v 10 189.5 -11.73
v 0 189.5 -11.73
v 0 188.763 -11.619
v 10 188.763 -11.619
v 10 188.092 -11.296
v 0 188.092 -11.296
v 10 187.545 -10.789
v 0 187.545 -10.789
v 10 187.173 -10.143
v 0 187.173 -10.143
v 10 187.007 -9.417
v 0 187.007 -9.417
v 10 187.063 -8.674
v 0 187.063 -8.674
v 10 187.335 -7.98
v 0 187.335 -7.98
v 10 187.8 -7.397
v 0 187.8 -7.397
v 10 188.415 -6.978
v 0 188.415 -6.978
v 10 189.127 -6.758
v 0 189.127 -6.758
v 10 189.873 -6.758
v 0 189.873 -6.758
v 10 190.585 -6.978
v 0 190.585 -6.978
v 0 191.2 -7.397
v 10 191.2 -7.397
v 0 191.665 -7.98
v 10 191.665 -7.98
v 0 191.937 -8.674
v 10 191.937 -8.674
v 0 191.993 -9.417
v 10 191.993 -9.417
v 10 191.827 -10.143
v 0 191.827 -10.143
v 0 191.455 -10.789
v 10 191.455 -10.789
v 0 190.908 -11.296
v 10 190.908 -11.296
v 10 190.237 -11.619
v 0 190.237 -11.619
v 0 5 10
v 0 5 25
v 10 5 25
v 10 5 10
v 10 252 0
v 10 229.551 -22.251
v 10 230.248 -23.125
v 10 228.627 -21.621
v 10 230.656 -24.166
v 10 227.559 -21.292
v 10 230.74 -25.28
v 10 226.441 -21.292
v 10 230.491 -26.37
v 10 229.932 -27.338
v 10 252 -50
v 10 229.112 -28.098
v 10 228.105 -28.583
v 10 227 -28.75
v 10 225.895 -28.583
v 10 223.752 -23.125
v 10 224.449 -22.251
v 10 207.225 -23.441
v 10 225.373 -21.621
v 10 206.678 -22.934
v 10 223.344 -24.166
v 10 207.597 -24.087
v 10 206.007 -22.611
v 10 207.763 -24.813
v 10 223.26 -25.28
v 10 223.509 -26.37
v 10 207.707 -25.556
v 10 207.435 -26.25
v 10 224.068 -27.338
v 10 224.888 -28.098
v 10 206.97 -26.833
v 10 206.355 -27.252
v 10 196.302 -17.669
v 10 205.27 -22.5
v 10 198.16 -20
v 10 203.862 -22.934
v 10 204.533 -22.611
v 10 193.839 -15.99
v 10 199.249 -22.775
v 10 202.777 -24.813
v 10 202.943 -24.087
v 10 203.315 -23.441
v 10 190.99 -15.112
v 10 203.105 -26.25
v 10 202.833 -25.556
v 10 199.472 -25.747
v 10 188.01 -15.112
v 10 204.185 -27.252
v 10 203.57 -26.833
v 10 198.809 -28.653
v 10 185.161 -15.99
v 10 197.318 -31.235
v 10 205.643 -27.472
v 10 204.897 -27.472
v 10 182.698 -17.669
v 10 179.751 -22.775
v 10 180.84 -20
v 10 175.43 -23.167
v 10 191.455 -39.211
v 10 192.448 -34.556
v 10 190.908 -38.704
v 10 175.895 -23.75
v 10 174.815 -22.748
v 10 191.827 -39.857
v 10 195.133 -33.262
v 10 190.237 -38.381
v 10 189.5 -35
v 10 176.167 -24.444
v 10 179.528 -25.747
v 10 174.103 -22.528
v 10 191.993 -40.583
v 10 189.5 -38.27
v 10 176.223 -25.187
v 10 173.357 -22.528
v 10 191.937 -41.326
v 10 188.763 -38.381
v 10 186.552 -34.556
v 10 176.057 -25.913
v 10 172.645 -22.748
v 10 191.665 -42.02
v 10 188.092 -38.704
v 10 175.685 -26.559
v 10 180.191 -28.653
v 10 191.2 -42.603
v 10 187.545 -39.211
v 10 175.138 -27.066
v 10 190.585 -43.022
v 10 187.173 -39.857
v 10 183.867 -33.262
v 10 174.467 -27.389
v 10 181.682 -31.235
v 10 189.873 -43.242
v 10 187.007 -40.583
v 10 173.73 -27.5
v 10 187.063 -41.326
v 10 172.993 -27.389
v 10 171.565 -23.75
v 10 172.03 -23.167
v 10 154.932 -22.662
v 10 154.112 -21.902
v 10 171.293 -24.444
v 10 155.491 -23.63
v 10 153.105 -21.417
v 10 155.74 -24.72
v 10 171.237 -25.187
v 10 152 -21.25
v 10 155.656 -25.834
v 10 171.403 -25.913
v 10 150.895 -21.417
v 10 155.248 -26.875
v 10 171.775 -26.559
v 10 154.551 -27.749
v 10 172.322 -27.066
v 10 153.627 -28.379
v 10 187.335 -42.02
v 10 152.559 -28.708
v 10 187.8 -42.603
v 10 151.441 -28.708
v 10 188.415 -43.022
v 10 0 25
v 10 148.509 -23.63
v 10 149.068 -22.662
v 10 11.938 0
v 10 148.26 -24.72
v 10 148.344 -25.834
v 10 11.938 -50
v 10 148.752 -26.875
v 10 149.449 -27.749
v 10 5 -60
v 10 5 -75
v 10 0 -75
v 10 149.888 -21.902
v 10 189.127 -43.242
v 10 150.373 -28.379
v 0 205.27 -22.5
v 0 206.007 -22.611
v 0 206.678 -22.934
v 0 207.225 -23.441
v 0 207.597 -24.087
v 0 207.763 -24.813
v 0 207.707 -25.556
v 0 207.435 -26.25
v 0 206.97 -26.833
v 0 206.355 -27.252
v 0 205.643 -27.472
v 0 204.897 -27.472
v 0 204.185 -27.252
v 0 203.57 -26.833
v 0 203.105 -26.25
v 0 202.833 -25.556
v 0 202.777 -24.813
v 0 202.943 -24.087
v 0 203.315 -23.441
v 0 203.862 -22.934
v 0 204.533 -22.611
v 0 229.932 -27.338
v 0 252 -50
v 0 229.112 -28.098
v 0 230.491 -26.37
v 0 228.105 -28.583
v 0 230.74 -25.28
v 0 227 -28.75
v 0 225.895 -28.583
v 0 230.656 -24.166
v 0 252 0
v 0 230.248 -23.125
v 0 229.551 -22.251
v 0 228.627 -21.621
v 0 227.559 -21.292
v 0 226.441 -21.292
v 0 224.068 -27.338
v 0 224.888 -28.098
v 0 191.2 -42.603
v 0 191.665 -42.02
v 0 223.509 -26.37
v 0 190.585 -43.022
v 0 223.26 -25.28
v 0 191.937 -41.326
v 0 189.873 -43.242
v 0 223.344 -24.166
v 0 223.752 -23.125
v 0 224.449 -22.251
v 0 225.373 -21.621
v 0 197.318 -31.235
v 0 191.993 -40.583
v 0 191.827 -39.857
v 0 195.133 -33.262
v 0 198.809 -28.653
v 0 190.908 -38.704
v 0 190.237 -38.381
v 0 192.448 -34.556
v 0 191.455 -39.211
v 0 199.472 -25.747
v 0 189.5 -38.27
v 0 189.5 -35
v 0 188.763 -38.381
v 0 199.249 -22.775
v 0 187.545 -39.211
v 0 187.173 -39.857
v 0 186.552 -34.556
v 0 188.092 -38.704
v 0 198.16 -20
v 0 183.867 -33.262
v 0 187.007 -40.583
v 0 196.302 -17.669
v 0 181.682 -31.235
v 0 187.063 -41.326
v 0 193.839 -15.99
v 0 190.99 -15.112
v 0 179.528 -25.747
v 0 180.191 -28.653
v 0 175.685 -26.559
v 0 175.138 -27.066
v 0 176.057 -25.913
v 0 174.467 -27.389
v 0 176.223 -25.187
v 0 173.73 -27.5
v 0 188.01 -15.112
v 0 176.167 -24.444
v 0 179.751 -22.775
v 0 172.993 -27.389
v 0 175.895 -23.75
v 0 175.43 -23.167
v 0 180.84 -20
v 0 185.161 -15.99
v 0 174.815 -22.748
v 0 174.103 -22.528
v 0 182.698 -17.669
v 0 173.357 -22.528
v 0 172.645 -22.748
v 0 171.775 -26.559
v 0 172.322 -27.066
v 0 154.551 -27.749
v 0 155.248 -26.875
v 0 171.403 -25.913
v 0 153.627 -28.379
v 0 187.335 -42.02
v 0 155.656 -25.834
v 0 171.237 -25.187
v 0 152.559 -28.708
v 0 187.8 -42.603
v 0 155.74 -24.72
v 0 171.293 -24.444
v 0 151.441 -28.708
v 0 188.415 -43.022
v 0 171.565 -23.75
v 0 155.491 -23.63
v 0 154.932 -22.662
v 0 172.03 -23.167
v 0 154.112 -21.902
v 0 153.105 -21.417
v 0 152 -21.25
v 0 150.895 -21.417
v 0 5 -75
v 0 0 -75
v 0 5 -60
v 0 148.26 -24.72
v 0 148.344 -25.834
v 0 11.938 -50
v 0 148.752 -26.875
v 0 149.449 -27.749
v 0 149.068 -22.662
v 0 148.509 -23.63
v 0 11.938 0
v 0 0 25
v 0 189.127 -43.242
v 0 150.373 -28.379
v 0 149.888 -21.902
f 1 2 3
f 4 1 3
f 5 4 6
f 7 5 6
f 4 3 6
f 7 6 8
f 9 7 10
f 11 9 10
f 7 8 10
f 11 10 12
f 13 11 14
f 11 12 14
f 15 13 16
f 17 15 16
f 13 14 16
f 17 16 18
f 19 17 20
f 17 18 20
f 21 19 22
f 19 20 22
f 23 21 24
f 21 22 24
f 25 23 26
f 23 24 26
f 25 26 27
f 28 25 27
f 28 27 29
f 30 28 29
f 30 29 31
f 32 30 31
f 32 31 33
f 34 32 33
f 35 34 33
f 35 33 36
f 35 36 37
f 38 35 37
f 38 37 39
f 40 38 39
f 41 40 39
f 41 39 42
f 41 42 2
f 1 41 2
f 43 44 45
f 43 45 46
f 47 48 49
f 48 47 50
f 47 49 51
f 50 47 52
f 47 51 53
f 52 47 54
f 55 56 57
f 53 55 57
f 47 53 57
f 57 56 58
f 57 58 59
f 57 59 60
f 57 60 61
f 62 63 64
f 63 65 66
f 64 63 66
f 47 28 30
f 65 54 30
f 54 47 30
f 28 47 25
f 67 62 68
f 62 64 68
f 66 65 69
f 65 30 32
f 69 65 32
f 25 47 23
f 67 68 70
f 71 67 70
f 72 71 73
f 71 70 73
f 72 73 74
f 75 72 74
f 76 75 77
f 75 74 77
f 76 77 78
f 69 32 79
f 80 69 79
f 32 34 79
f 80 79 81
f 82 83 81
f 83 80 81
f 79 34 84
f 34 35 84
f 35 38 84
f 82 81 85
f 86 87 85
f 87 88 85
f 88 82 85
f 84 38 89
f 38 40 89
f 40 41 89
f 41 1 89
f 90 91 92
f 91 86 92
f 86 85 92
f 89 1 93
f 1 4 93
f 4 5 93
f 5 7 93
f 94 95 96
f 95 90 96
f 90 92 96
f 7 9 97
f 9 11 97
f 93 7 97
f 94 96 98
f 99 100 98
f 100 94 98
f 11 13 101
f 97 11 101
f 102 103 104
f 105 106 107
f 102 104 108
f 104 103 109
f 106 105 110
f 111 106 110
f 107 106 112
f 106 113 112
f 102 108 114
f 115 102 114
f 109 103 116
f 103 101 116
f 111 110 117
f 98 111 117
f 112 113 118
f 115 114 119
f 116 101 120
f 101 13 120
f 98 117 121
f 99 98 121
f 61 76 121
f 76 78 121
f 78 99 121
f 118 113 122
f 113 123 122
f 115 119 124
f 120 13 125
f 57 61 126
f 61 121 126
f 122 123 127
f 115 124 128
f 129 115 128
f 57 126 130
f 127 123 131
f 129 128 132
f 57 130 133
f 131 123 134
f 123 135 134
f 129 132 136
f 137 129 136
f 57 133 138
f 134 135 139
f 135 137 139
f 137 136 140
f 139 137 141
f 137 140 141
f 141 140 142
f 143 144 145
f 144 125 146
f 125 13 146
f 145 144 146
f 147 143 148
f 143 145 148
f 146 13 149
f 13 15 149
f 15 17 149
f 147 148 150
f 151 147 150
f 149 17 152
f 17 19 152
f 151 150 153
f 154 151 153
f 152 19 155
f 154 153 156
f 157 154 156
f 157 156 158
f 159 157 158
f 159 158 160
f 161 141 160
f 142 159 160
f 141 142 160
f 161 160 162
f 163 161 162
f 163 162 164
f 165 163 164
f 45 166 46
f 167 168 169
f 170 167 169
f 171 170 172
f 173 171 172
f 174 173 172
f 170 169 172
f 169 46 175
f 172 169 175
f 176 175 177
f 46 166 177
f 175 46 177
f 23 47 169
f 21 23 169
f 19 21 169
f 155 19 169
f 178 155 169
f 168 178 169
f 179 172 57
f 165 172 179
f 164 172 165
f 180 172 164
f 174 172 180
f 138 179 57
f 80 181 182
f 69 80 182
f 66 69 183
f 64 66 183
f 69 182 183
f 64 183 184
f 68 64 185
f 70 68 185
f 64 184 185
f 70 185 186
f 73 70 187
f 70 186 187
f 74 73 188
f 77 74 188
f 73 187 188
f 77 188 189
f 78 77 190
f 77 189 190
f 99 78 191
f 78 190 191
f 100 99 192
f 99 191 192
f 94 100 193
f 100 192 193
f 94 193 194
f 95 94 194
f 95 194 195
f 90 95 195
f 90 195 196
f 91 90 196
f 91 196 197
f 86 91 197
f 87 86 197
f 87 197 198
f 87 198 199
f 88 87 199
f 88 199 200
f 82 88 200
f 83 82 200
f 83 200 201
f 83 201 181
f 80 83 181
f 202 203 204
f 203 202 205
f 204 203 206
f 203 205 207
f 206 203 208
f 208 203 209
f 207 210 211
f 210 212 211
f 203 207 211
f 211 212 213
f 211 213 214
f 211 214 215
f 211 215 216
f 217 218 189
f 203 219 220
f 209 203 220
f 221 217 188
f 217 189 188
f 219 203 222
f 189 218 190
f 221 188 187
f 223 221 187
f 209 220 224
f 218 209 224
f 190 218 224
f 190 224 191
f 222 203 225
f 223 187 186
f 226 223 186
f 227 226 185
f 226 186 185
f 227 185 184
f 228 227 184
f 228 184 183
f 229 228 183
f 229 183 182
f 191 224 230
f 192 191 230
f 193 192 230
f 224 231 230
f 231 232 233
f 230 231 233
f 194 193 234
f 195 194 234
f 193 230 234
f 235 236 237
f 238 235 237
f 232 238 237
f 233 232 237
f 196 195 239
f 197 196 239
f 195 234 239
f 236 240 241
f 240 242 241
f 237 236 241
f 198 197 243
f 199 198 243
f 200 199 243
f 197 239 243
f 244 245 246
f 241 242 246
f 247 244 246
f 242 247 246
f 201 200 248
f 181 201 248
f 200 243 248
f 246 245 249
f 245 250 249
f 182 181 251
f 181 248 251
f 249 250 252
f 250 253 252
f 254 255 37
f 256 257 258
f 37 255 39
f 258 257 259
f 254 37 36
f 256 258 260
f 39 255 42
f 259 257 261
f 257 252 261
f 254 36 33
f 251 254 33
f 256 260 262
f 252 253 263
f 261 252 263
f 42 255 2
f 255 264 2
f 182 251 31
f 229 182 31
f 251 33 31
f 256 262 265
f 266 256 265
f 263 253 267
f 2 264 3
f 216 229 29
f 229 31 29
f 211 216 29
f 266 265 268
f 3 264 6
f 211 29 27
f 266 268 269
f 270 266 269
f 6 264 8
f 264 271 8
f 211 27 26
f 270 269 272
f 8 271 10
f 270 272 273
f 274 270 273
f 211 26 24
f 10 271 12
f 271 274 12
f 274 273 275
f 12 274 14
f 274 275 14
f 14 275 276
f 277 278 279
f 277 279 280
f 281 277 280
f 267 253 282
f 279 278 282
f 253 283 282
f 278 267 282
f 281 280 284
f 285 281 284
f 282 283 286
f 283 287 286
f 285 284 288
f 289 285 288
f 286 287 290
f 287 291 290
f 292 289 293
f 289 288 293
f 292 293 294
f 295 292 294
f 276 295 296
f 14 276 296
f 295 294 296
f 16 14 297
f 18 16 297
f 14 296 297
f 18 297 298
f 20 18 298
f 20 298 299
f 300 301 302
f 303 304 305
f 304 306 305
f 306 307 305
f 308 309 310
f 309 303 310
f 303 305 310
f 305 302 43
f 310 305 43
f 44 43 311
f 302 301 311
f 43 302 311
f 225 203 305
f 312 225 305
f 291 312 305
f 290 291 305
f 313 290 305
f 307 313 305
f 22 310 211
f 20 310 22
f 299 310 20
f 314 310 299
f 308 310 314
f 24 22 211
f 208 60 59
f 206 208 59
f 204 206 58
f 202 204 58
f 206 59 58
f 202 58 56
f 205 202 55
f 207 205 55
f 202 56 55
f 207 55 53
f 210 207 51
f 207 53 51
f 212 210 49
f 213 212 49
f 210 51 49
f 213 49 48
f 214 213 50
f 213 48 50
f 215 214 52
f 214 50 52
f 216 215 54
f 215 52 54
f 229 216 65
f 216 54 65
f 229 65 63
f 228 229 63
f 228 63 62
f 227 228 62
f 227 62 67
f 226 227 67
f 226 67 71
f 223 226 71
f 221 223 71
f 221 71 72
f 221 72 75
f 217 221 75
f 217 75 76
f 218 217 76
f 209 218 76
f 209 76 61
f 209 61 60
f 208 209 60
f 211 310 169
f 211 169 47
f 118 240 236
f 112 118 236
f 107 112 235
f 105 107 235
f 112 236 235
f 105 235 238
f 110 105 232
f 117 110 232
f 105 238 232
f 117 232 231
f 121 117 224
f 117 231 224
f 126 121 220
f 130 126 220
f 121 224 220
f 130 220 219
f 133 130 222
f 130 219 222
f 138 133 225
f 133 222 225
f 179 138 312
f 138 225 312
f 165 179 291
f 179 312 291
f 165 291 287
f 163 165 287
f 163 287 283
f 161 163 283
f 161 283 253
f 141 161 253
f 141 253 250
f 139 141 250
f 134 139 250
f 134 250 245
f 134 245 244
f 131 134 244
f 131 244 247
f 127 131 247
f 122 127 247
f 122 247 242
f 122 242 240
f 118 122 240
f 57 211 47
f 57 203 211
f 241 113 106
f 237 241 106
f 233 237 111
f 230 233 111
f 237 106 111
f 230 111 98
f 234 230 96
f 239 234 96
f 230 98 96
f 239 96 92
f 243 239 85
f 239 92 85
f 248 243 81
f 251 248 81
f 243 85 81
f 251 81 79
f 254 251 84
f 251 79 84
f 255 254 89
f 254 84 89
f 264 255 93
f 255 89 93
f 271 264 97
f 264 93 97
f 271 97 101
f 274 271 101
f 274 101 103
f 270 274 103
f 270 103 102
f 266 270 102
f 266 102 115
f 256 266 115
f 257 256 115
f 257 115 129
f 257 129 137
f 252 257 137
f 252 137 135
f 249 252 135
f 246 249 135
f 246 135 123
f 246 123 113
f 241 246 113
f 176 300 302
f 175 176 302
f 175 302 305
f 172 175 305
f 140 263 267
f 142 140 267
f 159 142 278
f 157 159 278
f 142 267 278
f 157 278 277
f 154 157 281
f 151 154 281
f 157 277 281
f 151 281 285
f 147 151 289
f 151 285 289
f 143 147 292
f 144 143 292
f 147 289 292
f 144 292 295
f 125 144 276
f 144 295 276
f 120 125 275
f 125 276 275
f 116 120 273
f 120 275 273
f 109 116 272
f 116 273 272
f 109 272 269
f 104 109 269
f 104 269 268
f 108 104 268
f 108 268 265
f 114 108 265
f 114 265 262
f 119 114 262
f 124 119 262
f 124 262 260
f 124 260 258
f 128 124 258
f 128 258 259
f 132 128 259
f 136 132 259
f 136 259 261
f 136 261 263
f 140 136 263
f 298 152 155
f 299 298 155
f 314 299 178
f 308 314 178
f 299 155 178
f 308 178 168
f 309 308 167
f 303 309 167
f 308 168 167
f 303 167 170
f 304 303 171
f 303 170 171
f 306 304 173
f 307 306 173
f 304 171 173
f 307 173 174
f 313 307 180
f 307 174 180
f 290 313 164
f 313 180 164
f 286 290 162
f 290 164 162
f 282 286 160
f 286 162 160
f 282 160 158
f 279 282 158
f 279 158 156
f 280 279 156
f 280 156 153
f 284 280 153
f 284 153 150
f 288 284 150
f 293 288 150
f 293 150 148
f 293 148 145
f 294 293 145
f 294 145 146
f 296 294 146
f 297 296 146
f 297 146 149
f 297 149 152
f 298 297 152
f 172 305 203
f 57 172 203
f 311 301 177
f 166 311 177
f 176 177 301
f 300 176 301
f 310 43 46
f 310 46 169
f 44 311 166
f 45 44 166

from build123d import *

# Parameters (mm, degrees)
BOSS_EXTRUDE1_DEPTH = 252
CUT_EXTRUDE2_DEPTH  = 10
SKETCH4_W           = 25
SKETCH4_H           = 52
CUT_EXTRUDE3_DEPTH  = 10
SKETCH5_R           = 3.75
SKETCH5_R_2         = 10
CUT_EXTRUDE5_DEPTH  = 264.114043715
SKETCH6_R           = 2.5
CUT_EXTRUDE6_DEPTH  = 264.114043715


with BuildPart() as part:
    # Sketch1 → Boss-Extrude1 (new body)
    with BuildSketch(Plane(origin=(0, 0, 0), x_dir=(1, 0, 0), z_dir=(0, 1, 0))):
        Polygon((10, 0), (10, 50), (10, 75), (0, 75), (0, 50), (0, 0), (0, -25), (10, -25), align=None)
    extrude(amount=BOSS_EXTRUDE1_DEPTH)

    # Sketch3 → Cut-Extrude2 (cut)
    with BuildSketch(Plane.ZY):
        Polygon((25, 200), (25, 5), (10, 5), (0, 11.937821542), (0, 200), align=None)
        Polygon((-75, 5), (-60, 5), (-50, 11.937821542), (-50, 252), (-75, 252), align=None)
    extrude(amount=-CUT_EXTRUDE2_DEPTH, mode=Mode.SUBTRACT)

    # Sketch4 → Cut-Extrude3 (cut)
    with BuildSketch(Plane(origin=(10, 0, 0), x_dir=(0, 0, -1), z_dir=(1, 0, 0))):
        with Locations((-12.5, 226)):
            Rectangle(SKETCH4_W, SKETCH4_H)
    extrude(amount=-CUT_EXTRUDE3_DEPTH, mode=Mode.SUBTRACT)

    # Sketch5 → Cut-Extrude5 (cut, through all)
    with BuildSketch(Plane(origin=(10, 0, 0), x_dir=(0, 0, -1), z_dir=(1, 0, 0))):
        with Locations((25, 227)):
            Circle(SKETCH5_R)
        with Locations((25, 189.5)):
            Circle(SKETCH5_R_2)
        with Locations(Location((25, 152, 0), (0, 0, 180))):
            Circle(SKETCH5_R)
    extrude(amount=-CUT_EXTRUDE5_DEPTH, mode=Mode.SUBTRACT)

    # Sketch6 → Cut-Extrude6 (cut, through all)
    with BuildSketch(Plane.ZY):
        with Locations((-40.77, 189.5)):
            Circle(SKETCH6_R)
        with Locations(Location((-9.23, 189.5, 0), (0, 0, 180))):
            Circle(SKETCH6_R)
        with Locations((-25, 205.27)):
            Circle(SKETCH6_R)
        with Locations(Location((-25, 173.73, 0), (0, 0, 180))):
            Circle(SKETCH6_R)
    extrude(amount=-CUT_EXTRUDE6_DEPTH, mode=Mode.SUBTRACT)


solid = part.part
